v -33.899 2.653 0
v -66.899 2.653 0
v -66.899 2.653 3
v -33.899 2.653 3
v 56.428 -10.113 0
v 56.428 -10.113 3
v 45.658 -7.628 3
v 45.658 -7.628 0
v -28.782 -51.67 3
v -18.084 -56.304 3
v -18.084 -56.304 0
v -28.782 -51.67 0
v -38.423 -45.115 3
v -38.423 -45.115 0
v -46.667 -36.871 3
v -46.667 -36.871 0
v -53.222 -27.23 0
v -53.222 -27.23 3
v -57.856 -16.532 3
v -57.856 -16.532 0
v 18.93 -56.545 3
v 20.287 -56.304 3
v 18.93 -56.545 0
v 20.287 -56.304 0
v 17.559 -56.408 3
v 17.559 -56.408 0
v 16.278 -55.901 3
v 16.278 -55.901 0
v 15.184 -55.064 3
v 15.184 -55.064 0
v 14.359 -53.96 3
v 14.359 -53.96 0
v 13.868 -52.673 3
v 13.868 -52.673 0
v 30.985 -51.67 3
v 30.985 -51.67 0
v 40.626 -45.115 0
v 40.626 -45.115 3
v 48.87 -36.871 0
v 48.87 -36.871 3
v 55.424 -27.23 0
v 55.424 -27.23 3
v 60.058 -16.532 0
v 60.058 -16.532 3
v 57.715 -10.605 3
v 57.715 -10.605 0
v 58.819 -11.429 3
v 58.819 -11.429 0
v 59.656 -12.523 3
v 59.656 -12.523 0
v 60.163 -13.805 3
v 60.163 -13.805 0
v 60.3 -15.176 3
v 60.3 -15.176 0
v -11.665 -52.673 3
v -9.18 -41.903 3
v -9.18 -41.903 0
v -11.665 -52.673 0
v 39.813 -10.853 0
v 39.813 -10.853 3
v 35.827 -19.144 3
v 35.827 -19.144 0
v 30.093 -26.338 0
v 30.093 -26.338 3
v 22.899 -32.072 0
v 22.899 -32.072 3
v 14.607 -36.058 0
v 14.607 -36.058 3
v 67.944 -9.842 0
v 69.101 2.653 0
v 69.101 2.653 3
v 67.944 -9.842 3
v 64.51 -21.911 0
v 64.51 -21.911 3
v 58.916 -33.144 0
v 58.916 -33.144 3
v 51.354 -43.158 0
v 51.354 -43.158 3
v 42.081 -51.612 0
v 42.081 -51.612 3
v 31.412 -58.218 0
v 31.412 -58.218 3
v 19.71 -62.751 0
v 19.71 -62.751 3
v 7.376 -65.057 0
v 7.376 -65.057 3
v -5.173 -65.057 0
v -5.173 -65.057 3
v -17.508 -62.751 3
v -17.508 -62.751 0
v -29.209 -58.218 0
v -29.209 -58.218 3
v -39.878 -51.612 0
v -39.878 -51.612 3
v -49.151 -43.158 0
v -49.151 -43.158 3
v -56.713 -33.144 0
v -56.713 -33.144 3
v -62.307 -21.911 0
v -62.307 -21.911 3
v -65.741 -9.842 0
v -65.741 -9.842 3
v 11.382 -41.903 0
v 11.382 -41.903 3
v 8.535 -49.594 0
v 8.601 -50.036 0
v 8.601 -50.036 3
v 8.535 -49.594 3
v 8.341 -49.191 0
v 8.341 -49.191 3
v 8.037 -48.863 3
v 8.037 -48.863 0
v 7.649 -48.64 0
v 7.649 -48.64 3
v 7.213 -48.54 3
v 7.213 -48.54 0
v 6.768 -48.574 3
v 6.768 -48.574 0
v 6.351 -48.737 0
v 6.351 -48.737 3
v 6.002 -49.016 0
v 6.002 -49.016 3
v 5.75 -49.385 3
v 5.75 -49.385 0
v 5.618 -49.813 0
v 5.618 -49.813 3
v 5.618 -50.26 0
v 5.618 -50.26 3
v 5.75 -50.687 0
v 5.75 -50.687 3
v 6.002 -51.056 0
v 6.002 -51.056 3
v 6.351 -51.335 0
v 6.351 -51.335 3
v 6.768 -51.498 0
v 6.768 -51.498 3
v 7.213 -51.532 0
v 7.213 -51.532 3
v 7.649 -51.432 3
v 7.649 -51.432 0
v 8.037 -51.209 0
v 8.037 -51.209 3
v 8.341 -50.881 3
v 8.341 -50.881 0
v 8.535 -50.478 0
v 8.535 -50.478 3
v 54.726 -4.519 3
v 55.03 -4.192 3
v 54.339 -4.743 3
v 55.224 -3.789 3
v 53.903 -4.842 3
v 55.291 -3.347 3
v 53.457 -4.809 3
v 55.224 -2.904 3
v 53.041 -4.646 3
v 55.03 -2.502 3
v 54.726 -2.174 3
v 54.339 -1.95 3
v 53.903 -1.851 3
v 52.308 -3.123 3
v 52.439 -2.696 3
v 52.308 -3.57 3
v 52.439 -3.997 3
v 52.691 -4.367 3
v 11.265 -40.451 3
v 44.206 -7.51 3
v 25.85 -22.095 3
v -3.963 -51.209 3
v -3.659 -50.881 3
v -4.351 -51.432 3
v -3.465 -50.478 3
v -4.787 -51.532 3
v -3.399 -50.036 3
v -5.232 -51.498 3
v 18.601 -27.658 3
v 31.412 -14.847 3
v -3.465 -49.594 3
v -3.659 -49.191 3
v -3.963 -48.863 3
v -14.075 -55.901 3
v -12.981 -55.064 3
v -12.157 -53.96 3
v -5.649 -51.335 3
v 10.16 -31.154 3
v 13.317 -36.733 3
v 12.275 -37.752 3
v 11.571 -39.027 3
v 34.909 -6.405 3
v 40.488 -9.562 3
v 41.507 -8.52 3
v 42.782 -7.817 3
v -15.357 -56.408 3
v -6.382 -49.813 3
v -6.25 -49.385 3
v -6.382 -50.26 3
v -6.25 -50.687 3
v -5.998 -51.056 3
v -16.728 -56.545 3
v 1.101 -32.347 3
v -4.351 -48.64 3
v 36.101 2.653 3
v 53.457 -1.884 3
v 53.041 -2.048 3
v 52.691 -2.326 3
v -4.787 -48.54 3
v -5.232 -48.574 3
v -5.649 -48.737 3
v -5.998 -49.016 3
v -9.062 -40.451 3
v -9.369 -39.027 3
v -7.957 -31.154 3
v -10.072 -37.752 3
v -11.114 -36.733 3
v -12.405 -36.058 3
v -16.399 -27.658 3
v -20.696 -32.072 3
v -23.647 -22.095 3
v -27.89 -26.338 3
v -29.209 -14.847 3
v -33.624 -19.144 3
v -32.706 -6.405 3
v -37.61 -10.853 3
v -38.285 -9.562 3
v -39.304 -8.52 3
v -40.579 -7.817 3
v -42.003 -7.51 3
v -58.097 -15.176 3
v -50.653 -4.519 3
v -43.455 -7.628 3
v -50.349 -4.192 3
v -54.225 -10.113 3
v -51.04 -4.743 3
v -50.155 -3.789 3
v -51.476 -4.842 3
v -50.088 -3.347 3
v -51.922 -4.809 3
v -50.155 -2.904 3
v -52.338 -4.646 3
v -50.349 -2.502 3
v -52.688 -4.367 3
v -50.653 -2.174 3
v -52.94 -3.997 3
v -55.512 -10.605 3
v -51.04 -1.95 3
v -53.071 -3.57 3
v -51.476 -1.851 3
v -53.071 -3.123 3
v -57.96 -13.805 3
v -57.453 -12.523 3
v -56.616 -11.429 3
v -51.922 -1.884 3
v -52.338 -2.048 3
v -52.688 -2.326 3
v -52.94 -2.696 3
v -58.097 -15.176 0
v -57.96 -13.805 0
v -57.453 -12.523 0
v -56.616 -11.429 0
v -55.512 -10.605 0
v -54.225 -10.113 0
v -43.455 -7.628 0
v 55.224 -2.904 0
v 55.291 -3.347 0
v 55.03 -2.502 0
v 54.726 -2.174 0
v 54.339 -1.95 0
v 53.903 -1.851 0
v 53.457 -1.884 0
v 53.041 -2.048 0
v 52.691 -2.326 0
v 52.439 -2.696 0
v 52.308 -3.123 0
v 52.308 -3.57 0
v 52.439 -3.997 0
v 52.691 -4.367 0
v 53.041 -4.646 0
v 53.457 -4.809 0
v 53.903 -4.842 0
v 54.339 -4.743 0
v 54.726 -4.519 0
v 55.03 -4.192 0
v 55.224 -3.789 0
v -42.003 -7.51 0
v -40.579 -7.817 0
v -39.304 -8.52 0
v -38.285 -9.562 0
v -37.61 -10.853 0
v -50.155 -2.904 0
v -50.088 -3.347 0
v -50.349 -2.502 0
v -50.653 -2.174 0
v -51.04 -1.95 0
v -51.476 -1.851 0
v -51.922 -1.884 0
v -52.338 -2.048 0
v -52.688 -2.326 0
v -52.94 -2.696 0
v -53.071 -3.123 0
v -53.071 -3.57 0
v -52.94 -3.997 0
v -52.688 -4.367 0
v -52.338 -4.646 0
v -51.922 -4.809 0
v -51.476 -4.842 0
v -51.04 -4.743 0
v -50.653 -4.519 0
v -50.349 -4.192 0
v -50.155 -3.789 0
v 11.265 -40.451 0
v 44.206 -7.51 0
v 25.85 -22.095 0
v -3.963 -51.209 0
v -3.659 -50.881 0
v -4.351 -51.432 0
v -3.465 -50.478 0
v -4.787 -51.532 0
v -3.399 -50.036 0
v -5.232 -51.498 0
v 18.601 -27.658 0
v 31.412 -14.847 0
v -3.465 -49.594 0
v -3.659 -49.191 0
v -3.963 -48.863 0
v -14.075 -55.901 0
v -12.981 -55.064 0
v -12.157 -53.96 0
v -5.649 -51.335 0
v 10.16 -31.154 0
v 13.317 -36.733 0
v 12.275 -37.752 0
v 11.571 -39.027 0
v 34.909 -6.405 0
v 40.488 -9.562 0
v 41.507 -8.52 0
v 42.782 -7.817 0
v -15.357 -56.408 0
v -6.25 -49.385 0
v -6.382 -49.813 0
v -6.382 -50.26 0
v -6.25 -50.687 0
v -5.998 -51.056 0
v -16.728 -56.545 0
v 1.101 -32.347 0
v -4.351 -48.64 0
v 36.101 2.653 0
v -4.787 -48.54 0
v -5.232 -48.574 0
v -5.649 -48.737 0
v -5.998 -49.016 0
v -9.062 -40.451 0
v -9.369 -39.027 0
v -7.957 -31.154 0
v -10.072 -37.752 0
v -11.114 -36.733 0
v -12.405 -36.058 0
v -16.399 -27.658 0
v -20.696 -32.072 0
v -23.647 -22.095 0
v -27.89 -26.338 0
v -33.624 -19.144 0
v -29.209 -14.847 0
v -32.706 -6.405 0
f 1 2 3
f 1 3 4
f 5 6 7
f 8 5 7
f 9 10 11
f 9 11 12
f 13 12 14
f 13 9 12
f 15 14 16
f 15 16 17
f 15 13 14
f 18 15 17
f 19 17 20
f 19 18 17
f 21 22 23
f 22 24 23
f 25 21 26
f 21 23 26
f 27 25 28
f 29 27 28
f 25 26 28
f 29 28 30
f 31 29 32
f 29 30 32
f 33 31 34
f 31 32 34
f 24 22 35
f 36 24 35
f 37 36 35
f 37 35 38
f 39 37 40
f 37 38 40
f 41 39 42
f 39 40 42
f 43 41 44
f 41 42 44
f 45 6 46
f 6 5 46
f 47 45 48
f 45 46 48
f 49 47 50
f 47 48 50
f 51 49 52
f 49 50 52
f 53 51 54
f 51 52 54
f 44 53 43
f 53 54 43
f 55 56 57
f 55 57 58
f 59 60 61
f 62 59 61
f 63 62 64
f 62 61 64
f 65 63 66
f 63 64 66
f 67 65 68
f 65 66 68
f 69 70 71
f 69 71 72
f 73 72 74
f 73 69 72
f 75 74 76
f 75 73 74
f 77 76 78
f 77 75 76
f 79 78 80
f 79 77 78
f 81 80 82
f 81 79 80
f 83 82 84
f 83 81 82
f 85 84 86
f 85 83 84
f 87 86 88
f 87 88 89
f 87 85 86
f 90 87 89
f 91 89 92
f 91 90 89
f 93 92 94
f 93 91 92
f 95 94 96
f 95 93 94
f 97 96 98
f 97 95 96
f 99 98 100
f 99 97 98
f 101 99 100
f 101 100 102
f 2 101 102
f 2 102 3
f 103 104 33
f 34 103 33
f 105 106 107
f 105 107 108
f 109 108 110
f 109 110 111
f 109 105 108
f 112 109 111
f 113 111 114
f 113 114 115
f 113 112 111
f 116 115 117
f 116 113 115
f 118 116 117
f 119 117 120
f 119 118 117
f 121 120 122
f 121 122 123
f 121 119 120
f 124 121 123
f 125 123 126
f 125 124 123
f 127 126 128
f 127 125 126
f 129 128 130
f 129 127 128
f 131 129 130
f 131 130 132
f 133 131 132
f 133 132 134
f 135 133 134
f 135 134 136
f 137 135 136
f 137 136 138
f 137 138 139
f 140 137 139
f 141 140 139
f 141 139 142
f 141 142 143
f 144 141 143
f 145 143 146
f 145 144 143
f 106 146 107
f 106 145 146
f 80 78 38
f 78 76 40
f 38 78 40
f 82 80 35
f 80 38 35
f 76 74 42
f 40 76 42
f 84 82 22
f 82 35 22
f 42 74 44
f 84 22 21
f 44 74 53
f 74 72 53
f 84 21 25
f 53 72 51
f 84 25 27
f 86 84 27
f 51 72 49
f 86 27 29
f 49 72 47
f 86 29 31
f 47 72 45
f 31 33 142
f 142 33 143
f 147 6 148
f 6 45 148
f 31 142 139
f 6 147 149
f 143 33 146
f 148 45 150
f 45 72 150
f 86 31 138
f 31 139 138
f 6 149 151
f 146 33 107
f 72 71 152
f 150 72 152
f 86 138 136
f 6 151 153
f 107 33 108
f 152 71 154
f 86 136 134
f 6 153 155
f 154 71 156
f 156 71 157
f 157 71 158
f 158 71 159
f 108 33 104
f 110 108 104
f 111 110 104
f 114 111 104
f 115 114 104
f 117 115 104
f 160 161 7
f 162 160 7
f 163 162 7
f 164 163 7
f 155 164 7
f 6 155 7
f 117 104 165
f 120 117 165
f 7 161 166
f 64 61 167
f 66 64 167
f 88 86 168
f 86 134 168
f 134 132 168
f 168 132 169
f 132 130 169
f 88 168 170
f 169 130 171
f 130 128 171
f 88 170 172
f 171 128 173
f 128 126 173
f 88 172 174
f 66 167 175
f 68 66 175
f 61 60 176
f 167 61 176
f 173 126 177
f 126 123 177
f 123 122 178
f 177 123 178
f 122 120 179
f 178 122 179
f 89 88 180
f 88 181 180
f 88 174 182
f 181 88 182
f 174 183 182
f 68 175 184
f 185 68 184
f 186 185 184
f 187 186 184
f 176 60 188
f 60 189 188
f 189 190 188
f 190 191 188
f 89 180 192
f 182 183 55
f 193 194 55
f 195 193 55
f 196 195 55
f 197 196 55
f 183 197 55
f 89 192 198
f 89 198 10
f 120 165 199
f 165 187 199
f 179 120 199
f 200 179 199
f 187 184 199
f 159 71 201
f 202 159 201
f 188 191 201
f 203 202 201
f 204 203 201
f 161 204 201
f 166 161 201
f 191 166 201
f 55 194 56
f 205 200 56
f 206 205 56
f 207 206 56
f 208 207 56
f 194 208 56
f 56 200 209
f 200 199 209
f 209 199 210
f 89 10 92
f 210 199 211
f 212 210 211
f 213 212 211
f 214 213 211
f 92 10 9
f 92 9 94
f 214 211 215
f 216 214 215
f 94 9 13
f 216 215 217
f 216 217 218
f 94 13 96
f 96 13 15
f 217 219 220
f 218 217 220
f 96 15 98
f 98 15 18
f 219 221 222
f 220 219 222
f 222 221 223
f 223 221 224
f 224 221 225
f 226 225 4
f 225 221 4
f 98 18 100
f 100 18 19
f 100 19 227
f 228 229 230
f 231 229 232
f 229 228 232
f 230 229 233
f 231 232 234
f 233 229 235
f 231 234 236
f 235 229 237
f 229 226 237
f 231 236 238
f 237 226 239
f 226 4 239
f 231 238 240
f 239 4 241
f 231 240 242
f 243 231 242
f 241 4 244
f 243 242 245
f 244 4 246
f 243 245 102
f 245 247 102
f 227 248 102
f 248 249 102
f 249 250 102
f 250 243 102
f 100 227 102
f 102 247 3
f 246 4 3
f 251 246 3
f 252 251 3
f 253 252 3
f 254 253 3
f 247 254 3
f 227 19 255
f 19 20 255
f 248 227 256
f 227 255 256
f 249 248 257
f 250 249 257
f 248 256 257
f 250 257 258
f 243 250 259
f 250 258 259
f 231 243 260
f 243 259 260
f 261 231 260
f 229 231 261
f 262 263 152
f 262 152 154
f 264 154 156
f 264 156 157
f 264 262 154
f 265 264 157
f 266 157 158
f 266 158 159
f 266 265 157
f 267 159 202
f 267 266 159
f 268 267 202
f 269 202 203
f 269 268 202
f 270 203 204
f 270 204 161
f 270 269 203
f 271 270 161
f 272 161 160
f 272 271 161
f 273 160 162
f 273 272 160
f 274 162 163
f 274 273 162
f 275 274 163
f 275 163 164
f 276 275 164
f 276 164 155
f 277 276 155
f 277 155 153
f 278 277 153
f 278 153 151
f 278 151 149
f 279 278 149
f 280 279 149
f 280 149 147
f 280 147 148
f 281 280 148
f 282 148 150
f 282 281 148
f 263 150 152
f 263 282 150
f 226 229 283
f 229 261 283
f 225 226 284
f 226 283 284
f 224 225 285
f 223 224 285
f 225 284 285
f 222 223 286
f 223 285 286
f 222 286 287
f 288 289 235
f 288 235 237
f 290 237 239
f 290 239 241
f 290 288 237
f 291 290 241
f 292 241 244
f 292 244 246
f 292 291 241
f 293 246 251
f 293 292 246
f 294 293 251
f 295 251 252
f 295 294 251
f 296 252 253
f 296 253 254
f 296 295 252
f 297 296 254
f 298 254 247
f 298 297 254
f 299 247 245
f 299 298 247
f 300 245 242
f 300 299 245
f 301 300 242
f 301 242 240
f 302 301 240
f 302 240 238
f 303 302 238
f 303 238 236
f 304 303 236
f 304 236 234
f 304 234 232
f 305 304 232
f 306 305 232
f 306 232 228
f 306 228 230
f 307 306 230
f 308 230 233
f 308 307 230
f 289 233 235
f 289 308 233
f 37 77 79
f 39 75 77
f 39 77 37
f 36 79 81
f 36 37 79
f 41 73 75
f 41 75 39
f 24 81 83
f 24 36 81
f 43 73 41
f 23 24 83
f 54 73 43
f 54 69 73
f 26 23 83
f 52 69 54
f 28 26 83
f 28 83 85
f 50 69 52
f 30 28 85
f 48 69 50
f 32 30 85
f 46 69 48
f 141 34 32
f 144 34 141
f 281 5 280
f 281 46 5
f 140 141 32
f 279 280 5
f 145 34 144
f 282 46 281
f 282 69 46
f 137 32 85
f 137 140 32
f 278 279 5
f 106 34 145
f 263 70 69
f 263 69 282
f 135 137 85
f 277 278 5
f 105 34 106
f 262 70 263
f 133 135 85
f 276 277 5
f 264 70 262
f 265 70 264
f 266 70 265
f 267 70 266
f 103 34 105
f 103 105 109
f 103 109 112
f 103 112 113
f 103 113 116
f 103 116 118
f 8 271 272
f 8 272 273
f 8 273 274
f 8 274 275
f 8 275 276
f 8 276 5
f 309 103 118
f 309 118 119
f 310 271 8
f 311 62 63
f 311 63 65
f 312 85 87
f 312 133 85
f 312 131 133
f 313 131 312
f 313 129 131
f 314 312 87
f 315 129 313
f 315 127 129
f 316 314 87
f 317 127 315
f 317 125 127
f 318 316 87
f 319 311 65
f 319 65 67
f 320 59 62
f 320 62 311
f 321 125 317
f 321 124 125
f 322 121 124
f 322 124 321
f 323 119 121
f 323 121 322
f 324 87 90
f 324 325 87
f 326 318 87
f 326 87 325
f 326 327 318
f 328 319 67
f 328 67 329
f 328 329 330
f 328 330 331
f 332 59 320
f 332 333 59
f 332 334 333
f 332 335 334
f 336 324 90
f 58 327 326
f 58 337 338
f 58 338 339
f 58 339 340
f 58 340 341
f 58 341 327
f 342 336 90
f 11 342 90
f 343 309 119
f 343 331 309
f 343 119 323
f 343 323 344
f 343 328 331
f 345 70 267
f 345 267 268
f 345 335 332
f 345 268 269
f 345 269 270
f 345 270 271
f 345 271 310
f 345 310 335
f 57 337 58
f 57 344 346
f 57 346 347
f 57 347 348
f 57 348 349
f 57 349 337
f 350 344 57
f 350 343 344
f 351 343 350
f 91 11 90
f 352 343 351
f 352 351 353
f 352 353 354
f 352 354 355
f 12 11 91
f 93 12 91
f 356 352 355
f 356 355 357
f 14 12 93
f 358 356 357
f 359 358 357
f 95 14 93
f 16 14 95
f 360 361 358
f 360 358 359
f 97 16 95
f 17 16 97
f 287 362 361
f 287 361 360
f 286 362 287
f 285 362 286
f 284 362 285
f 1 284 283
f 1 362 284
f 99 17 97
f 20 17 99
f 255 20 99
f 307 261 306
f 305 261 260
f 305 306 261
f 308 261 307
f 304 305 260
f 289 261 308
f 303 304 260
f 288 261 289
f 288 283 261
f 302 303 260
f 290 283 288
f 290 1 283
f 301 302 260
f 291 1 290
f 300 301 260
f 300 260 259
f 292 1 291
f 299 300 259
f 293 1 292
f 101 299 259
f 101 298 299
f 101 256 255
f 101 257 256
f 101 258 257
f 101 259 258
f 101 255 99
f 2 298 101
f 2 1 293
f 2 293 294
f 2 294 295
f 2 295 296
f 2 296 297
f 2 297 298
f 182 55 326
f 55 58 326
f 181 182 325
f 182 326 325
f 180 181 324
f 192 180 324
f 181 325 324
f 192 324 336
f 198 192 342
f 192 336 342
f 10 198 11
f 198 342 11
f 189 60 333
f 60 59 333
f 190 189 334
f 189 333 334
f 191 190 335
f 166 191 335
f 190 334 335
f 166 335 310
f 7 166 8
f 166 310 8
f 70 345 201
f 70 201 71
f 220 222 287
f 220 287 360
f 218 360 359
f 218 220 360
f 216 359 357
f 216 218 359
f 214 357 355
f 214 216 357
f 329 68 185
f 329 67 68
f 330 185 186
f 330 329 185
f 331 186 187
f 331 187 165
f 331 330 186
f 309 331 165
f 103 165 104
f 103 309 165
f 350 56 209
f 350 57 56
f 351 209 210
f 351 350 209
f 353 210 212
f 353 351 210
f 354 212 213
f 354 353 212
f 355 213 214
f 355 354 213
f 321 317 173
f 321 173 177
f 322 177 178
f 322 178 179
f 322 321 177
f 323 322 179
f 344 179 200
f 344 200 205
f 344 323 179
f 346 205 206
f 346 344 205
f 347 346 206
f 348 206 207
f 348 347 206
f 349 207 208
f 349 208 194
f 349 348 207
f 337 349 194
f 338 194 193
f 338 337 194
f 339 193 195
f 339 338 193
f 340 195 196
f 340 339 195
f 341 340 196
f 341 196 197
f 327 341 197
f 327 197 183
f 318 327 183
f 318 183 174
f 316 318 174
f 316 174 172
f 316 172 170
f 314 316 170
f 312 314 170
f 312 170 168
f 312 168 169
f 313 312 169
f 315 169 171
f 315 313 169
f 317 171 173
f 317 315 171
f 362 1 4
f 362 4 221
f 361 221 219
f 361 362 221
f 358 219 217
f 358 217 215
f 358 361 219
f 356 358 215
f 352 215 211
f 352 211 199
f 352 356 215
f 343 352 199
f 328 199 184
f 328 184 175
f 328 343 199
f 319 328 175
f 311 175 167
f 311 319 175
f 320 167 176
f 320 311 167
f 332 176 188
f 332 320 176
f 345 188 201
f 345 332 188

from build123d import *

# Parameters (mm, degrees)
SKETCH_1_R          = 1.5
EXTRUDE_1_DEPTH     = 3
CUT_EXTRUDE_1_DEPTH = 3
FILLET_1_R          = 5


with BuildPart() as part:
    # 草图1 → 凸台-拉伸1 (new body)
    with BuildSketch(Plane.XY):
        with BuildLine():
            Line((-66.898598537, 2.653376251), (-33.898598537, 2.653376251))
            ThreePointArc((-33.898598537, 2.653376251), (1.101401463, -32.346623749), (36.101401463, 2.653376251))
            Line((36.101401463, 2.653376251), (69.101401463, 2.653376251))
            ThreePointArc((69.101401463, 2.653376251), (1.101401463, -65.346623749), (-66.898598537, 2.653376251))
        make_face()
        with Locations((-51.588074716, -3.346623749)):
            Circle(SKETCH_1_R, mode=Mode.SUBTRACT)
        with Locations((-4.898598537, -50.036099928)):
            Circle(SKETCH_1_R, mode=Mode.SUBTRACT)
        with Locations((7.101401463, -50.036099928)):
            Circle(SKETCH_1_R, mode=Mode.SUBTRACT)
        with Locations((53.790877642, -3.346623749)):
            Circle(SKETCH_1_R, mode=Mode.SUBTRACT)
    extrude(amount=EXTRUDE_1_DEPTH)

    # 草图2 → 切除-拉伸1 (cut)
    with BuildSketch(Plane.XY.offset(3)):
        with BuildLine():
            Line((10.319593038, -37.29690465), (15.041105796, -57.759243648))
            ThreePointArc((15.041105796, -57.759243648), (44.942021896, -41.187244183), (61.514021362, -11.286328082))
            Line((61.514021362, -11.286328082), (41.051682364, -6.564815324))
            ThreePointArc((41.051682364, -6.564815324), (30.092779491, -26.338001778), (10.319593038, -37.29690465))
        make_face()
        with BuildLine():
            Line((-8.116790112, -37.29690465), (-12.83830287, -57.759243648))
            ThreePointArc((-12.83830287, -57.759243648), (-42.739218971, -41.187244183), (-59.311218437, -11.286328082))
            Line((-59.311218437, -11.286328082), (-38.848879439, -6.564815324))
            ThreePointArc((-38.848879439, -6.564815324), (-27.889976566, -26.338001778), (-8.116790112, -37.29690465))
        make_face()
    extrude(amount=-CUT_EXTRUDE_1_DEPTH, mode=Mode.SUBTRACT)

    # 圆角1
    fillet_1_edges = [part.edges().sort_by_distance(p)[0] for p in [
        (-38.848879439, -6.564815324, 1.5),
        (-8.116790112, -37.29690465, 1.5),
        (-12.83830287, -57.759243648, 1.5),
        (-59.311218437, -11.286328082, 1.5),
        (10.319593038, -37.29690465, 1.5),
        (41.051682364, -6.564815324, 1.5),
        (61.514021362, -11.286328082, 1.5),
        (15.041105796, -57.759243648, 1.5),
    ]]
    fillet(fillet_1_edges, radius=FILLET_1_R)


solid = part.part
